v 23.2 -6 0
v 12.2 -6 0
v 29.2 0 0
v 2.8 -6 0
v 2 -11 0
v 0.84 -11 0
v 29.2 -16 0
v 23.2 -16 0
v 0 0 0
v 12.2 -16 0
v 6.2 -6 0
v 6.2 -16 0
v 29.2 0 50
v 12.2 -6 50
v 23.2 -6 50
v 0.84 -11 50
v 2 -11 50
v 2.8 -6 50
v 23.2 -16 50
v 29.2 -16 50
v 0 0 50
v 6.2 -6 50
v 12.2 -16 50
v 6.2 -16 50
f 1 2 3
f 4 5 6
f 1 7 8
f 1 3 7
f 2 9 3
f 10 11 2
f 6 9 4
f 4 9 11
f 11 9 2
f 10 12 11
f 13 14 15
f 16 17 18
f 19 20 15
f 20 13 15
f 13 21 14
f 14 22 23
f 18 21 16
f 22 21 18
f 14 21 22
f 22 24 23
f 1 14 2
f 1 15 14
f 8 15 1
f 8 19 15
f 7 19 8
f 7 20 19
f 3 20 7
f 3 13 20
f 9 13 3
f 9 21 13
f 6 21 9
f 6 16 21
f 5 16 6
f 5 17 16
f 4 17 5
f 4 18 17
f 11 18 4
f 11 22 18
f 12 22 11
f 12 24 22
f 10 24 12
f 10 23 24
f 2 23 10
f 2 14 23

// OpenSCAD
// Standalone render of the rim piece assembly.
// See rim_piece_assembly.scad header for full option reference.
include <rim_piece_assembly.scad>

/* [Demo selection] */
demo_mode = "default";
// "default" | "male_both" | "female_both" | "start_male_finish_female"
// | "start_female_finish_male" | "corner_end" | "rim_corner" | "ingress"
// | "combo" | "rim_corner_ingress_a" | "rim_corner_ingress_b" | "feeding_door"
// Rectangular lid demos: open rim_rectangular_lid.scad (or rim_rect_demo.scad).

if (demo_mode == "default")
    rim_piece_assembly(length = edge_default_length);

if (demo_mode == "male_both")
    rim_piece_assembly(length = 90, edge_join_ends = 2);

if (demo_mode == "female_both")
    rim_piece_assembly(length = 90, edge_join_ends = 4);

if (demo_mode == "start_male_finish_female")
    rim_piece_assembly(length = 90, edge_join_ends = 1);

if (demo_mode == "start_female_finish_male")
    rim_piece_assembly(length = 90, edge_join_ends = 3);

if (demo_mode == "corner_end")
    rim_piece_assembly(
        length = 120,
        edge_join_ends = 1,
        cornerpiecenum = 3
    );

if (demo_mode == "rim_corner")
    rim_corner_assembly(
        length_a = 80,
        length_b = 60,
        join_a = 1,
        join_b = 2
    );

if (demo_mode == "ingress")
    rim_piece_assembly(
        length = 150,
        lid_ingress = true,
        ingress_depth = 30,
        ingress_length = 70
    );

if (demo_mode == "combo")
    rim_piece_assembly(
        length = 200,
        edge_join_ends = 2,
        cord_hole = true,
        cord_hole_pos = "left",
        lid_ingress = true,
        ingress_depth = 28,
        ingress_length = 70
    );

if (demo_mode == "rim_corner_ingress_a")
    rim_corner_assembly(
        length_a = 160,
        length_b = 100,
        join_b = 2,
        cord_hole = true,
        cord_hole_pos = "left",
        cord_hole_on = "a",
        lid_ingress = true,
        ingress_depth = 28,
        ingress_length = 70,
        ingress_on = "a"
    );

if (demo_mode == "rim_corner_ingress_b")
    rim_corner_assembly(
        length_a = 120,
        length_b = 170,
        join_b = 2,
        cord_hole = true,
        cord_hole_pos = "middle",
        cord_hole_on = "b",
        lid_ingress = true,
        ingress_depth = 28,
        ingress_length = 10,
        ingress_on = "b"
    );

if (demo_mode == "feeding_door")
    rim_piece_assembly(
        length = 180,
        edge_join_ends = 2,
        feeding_door = true,
        feeding_opening = 70,
        feeding_depth = 40
    );
